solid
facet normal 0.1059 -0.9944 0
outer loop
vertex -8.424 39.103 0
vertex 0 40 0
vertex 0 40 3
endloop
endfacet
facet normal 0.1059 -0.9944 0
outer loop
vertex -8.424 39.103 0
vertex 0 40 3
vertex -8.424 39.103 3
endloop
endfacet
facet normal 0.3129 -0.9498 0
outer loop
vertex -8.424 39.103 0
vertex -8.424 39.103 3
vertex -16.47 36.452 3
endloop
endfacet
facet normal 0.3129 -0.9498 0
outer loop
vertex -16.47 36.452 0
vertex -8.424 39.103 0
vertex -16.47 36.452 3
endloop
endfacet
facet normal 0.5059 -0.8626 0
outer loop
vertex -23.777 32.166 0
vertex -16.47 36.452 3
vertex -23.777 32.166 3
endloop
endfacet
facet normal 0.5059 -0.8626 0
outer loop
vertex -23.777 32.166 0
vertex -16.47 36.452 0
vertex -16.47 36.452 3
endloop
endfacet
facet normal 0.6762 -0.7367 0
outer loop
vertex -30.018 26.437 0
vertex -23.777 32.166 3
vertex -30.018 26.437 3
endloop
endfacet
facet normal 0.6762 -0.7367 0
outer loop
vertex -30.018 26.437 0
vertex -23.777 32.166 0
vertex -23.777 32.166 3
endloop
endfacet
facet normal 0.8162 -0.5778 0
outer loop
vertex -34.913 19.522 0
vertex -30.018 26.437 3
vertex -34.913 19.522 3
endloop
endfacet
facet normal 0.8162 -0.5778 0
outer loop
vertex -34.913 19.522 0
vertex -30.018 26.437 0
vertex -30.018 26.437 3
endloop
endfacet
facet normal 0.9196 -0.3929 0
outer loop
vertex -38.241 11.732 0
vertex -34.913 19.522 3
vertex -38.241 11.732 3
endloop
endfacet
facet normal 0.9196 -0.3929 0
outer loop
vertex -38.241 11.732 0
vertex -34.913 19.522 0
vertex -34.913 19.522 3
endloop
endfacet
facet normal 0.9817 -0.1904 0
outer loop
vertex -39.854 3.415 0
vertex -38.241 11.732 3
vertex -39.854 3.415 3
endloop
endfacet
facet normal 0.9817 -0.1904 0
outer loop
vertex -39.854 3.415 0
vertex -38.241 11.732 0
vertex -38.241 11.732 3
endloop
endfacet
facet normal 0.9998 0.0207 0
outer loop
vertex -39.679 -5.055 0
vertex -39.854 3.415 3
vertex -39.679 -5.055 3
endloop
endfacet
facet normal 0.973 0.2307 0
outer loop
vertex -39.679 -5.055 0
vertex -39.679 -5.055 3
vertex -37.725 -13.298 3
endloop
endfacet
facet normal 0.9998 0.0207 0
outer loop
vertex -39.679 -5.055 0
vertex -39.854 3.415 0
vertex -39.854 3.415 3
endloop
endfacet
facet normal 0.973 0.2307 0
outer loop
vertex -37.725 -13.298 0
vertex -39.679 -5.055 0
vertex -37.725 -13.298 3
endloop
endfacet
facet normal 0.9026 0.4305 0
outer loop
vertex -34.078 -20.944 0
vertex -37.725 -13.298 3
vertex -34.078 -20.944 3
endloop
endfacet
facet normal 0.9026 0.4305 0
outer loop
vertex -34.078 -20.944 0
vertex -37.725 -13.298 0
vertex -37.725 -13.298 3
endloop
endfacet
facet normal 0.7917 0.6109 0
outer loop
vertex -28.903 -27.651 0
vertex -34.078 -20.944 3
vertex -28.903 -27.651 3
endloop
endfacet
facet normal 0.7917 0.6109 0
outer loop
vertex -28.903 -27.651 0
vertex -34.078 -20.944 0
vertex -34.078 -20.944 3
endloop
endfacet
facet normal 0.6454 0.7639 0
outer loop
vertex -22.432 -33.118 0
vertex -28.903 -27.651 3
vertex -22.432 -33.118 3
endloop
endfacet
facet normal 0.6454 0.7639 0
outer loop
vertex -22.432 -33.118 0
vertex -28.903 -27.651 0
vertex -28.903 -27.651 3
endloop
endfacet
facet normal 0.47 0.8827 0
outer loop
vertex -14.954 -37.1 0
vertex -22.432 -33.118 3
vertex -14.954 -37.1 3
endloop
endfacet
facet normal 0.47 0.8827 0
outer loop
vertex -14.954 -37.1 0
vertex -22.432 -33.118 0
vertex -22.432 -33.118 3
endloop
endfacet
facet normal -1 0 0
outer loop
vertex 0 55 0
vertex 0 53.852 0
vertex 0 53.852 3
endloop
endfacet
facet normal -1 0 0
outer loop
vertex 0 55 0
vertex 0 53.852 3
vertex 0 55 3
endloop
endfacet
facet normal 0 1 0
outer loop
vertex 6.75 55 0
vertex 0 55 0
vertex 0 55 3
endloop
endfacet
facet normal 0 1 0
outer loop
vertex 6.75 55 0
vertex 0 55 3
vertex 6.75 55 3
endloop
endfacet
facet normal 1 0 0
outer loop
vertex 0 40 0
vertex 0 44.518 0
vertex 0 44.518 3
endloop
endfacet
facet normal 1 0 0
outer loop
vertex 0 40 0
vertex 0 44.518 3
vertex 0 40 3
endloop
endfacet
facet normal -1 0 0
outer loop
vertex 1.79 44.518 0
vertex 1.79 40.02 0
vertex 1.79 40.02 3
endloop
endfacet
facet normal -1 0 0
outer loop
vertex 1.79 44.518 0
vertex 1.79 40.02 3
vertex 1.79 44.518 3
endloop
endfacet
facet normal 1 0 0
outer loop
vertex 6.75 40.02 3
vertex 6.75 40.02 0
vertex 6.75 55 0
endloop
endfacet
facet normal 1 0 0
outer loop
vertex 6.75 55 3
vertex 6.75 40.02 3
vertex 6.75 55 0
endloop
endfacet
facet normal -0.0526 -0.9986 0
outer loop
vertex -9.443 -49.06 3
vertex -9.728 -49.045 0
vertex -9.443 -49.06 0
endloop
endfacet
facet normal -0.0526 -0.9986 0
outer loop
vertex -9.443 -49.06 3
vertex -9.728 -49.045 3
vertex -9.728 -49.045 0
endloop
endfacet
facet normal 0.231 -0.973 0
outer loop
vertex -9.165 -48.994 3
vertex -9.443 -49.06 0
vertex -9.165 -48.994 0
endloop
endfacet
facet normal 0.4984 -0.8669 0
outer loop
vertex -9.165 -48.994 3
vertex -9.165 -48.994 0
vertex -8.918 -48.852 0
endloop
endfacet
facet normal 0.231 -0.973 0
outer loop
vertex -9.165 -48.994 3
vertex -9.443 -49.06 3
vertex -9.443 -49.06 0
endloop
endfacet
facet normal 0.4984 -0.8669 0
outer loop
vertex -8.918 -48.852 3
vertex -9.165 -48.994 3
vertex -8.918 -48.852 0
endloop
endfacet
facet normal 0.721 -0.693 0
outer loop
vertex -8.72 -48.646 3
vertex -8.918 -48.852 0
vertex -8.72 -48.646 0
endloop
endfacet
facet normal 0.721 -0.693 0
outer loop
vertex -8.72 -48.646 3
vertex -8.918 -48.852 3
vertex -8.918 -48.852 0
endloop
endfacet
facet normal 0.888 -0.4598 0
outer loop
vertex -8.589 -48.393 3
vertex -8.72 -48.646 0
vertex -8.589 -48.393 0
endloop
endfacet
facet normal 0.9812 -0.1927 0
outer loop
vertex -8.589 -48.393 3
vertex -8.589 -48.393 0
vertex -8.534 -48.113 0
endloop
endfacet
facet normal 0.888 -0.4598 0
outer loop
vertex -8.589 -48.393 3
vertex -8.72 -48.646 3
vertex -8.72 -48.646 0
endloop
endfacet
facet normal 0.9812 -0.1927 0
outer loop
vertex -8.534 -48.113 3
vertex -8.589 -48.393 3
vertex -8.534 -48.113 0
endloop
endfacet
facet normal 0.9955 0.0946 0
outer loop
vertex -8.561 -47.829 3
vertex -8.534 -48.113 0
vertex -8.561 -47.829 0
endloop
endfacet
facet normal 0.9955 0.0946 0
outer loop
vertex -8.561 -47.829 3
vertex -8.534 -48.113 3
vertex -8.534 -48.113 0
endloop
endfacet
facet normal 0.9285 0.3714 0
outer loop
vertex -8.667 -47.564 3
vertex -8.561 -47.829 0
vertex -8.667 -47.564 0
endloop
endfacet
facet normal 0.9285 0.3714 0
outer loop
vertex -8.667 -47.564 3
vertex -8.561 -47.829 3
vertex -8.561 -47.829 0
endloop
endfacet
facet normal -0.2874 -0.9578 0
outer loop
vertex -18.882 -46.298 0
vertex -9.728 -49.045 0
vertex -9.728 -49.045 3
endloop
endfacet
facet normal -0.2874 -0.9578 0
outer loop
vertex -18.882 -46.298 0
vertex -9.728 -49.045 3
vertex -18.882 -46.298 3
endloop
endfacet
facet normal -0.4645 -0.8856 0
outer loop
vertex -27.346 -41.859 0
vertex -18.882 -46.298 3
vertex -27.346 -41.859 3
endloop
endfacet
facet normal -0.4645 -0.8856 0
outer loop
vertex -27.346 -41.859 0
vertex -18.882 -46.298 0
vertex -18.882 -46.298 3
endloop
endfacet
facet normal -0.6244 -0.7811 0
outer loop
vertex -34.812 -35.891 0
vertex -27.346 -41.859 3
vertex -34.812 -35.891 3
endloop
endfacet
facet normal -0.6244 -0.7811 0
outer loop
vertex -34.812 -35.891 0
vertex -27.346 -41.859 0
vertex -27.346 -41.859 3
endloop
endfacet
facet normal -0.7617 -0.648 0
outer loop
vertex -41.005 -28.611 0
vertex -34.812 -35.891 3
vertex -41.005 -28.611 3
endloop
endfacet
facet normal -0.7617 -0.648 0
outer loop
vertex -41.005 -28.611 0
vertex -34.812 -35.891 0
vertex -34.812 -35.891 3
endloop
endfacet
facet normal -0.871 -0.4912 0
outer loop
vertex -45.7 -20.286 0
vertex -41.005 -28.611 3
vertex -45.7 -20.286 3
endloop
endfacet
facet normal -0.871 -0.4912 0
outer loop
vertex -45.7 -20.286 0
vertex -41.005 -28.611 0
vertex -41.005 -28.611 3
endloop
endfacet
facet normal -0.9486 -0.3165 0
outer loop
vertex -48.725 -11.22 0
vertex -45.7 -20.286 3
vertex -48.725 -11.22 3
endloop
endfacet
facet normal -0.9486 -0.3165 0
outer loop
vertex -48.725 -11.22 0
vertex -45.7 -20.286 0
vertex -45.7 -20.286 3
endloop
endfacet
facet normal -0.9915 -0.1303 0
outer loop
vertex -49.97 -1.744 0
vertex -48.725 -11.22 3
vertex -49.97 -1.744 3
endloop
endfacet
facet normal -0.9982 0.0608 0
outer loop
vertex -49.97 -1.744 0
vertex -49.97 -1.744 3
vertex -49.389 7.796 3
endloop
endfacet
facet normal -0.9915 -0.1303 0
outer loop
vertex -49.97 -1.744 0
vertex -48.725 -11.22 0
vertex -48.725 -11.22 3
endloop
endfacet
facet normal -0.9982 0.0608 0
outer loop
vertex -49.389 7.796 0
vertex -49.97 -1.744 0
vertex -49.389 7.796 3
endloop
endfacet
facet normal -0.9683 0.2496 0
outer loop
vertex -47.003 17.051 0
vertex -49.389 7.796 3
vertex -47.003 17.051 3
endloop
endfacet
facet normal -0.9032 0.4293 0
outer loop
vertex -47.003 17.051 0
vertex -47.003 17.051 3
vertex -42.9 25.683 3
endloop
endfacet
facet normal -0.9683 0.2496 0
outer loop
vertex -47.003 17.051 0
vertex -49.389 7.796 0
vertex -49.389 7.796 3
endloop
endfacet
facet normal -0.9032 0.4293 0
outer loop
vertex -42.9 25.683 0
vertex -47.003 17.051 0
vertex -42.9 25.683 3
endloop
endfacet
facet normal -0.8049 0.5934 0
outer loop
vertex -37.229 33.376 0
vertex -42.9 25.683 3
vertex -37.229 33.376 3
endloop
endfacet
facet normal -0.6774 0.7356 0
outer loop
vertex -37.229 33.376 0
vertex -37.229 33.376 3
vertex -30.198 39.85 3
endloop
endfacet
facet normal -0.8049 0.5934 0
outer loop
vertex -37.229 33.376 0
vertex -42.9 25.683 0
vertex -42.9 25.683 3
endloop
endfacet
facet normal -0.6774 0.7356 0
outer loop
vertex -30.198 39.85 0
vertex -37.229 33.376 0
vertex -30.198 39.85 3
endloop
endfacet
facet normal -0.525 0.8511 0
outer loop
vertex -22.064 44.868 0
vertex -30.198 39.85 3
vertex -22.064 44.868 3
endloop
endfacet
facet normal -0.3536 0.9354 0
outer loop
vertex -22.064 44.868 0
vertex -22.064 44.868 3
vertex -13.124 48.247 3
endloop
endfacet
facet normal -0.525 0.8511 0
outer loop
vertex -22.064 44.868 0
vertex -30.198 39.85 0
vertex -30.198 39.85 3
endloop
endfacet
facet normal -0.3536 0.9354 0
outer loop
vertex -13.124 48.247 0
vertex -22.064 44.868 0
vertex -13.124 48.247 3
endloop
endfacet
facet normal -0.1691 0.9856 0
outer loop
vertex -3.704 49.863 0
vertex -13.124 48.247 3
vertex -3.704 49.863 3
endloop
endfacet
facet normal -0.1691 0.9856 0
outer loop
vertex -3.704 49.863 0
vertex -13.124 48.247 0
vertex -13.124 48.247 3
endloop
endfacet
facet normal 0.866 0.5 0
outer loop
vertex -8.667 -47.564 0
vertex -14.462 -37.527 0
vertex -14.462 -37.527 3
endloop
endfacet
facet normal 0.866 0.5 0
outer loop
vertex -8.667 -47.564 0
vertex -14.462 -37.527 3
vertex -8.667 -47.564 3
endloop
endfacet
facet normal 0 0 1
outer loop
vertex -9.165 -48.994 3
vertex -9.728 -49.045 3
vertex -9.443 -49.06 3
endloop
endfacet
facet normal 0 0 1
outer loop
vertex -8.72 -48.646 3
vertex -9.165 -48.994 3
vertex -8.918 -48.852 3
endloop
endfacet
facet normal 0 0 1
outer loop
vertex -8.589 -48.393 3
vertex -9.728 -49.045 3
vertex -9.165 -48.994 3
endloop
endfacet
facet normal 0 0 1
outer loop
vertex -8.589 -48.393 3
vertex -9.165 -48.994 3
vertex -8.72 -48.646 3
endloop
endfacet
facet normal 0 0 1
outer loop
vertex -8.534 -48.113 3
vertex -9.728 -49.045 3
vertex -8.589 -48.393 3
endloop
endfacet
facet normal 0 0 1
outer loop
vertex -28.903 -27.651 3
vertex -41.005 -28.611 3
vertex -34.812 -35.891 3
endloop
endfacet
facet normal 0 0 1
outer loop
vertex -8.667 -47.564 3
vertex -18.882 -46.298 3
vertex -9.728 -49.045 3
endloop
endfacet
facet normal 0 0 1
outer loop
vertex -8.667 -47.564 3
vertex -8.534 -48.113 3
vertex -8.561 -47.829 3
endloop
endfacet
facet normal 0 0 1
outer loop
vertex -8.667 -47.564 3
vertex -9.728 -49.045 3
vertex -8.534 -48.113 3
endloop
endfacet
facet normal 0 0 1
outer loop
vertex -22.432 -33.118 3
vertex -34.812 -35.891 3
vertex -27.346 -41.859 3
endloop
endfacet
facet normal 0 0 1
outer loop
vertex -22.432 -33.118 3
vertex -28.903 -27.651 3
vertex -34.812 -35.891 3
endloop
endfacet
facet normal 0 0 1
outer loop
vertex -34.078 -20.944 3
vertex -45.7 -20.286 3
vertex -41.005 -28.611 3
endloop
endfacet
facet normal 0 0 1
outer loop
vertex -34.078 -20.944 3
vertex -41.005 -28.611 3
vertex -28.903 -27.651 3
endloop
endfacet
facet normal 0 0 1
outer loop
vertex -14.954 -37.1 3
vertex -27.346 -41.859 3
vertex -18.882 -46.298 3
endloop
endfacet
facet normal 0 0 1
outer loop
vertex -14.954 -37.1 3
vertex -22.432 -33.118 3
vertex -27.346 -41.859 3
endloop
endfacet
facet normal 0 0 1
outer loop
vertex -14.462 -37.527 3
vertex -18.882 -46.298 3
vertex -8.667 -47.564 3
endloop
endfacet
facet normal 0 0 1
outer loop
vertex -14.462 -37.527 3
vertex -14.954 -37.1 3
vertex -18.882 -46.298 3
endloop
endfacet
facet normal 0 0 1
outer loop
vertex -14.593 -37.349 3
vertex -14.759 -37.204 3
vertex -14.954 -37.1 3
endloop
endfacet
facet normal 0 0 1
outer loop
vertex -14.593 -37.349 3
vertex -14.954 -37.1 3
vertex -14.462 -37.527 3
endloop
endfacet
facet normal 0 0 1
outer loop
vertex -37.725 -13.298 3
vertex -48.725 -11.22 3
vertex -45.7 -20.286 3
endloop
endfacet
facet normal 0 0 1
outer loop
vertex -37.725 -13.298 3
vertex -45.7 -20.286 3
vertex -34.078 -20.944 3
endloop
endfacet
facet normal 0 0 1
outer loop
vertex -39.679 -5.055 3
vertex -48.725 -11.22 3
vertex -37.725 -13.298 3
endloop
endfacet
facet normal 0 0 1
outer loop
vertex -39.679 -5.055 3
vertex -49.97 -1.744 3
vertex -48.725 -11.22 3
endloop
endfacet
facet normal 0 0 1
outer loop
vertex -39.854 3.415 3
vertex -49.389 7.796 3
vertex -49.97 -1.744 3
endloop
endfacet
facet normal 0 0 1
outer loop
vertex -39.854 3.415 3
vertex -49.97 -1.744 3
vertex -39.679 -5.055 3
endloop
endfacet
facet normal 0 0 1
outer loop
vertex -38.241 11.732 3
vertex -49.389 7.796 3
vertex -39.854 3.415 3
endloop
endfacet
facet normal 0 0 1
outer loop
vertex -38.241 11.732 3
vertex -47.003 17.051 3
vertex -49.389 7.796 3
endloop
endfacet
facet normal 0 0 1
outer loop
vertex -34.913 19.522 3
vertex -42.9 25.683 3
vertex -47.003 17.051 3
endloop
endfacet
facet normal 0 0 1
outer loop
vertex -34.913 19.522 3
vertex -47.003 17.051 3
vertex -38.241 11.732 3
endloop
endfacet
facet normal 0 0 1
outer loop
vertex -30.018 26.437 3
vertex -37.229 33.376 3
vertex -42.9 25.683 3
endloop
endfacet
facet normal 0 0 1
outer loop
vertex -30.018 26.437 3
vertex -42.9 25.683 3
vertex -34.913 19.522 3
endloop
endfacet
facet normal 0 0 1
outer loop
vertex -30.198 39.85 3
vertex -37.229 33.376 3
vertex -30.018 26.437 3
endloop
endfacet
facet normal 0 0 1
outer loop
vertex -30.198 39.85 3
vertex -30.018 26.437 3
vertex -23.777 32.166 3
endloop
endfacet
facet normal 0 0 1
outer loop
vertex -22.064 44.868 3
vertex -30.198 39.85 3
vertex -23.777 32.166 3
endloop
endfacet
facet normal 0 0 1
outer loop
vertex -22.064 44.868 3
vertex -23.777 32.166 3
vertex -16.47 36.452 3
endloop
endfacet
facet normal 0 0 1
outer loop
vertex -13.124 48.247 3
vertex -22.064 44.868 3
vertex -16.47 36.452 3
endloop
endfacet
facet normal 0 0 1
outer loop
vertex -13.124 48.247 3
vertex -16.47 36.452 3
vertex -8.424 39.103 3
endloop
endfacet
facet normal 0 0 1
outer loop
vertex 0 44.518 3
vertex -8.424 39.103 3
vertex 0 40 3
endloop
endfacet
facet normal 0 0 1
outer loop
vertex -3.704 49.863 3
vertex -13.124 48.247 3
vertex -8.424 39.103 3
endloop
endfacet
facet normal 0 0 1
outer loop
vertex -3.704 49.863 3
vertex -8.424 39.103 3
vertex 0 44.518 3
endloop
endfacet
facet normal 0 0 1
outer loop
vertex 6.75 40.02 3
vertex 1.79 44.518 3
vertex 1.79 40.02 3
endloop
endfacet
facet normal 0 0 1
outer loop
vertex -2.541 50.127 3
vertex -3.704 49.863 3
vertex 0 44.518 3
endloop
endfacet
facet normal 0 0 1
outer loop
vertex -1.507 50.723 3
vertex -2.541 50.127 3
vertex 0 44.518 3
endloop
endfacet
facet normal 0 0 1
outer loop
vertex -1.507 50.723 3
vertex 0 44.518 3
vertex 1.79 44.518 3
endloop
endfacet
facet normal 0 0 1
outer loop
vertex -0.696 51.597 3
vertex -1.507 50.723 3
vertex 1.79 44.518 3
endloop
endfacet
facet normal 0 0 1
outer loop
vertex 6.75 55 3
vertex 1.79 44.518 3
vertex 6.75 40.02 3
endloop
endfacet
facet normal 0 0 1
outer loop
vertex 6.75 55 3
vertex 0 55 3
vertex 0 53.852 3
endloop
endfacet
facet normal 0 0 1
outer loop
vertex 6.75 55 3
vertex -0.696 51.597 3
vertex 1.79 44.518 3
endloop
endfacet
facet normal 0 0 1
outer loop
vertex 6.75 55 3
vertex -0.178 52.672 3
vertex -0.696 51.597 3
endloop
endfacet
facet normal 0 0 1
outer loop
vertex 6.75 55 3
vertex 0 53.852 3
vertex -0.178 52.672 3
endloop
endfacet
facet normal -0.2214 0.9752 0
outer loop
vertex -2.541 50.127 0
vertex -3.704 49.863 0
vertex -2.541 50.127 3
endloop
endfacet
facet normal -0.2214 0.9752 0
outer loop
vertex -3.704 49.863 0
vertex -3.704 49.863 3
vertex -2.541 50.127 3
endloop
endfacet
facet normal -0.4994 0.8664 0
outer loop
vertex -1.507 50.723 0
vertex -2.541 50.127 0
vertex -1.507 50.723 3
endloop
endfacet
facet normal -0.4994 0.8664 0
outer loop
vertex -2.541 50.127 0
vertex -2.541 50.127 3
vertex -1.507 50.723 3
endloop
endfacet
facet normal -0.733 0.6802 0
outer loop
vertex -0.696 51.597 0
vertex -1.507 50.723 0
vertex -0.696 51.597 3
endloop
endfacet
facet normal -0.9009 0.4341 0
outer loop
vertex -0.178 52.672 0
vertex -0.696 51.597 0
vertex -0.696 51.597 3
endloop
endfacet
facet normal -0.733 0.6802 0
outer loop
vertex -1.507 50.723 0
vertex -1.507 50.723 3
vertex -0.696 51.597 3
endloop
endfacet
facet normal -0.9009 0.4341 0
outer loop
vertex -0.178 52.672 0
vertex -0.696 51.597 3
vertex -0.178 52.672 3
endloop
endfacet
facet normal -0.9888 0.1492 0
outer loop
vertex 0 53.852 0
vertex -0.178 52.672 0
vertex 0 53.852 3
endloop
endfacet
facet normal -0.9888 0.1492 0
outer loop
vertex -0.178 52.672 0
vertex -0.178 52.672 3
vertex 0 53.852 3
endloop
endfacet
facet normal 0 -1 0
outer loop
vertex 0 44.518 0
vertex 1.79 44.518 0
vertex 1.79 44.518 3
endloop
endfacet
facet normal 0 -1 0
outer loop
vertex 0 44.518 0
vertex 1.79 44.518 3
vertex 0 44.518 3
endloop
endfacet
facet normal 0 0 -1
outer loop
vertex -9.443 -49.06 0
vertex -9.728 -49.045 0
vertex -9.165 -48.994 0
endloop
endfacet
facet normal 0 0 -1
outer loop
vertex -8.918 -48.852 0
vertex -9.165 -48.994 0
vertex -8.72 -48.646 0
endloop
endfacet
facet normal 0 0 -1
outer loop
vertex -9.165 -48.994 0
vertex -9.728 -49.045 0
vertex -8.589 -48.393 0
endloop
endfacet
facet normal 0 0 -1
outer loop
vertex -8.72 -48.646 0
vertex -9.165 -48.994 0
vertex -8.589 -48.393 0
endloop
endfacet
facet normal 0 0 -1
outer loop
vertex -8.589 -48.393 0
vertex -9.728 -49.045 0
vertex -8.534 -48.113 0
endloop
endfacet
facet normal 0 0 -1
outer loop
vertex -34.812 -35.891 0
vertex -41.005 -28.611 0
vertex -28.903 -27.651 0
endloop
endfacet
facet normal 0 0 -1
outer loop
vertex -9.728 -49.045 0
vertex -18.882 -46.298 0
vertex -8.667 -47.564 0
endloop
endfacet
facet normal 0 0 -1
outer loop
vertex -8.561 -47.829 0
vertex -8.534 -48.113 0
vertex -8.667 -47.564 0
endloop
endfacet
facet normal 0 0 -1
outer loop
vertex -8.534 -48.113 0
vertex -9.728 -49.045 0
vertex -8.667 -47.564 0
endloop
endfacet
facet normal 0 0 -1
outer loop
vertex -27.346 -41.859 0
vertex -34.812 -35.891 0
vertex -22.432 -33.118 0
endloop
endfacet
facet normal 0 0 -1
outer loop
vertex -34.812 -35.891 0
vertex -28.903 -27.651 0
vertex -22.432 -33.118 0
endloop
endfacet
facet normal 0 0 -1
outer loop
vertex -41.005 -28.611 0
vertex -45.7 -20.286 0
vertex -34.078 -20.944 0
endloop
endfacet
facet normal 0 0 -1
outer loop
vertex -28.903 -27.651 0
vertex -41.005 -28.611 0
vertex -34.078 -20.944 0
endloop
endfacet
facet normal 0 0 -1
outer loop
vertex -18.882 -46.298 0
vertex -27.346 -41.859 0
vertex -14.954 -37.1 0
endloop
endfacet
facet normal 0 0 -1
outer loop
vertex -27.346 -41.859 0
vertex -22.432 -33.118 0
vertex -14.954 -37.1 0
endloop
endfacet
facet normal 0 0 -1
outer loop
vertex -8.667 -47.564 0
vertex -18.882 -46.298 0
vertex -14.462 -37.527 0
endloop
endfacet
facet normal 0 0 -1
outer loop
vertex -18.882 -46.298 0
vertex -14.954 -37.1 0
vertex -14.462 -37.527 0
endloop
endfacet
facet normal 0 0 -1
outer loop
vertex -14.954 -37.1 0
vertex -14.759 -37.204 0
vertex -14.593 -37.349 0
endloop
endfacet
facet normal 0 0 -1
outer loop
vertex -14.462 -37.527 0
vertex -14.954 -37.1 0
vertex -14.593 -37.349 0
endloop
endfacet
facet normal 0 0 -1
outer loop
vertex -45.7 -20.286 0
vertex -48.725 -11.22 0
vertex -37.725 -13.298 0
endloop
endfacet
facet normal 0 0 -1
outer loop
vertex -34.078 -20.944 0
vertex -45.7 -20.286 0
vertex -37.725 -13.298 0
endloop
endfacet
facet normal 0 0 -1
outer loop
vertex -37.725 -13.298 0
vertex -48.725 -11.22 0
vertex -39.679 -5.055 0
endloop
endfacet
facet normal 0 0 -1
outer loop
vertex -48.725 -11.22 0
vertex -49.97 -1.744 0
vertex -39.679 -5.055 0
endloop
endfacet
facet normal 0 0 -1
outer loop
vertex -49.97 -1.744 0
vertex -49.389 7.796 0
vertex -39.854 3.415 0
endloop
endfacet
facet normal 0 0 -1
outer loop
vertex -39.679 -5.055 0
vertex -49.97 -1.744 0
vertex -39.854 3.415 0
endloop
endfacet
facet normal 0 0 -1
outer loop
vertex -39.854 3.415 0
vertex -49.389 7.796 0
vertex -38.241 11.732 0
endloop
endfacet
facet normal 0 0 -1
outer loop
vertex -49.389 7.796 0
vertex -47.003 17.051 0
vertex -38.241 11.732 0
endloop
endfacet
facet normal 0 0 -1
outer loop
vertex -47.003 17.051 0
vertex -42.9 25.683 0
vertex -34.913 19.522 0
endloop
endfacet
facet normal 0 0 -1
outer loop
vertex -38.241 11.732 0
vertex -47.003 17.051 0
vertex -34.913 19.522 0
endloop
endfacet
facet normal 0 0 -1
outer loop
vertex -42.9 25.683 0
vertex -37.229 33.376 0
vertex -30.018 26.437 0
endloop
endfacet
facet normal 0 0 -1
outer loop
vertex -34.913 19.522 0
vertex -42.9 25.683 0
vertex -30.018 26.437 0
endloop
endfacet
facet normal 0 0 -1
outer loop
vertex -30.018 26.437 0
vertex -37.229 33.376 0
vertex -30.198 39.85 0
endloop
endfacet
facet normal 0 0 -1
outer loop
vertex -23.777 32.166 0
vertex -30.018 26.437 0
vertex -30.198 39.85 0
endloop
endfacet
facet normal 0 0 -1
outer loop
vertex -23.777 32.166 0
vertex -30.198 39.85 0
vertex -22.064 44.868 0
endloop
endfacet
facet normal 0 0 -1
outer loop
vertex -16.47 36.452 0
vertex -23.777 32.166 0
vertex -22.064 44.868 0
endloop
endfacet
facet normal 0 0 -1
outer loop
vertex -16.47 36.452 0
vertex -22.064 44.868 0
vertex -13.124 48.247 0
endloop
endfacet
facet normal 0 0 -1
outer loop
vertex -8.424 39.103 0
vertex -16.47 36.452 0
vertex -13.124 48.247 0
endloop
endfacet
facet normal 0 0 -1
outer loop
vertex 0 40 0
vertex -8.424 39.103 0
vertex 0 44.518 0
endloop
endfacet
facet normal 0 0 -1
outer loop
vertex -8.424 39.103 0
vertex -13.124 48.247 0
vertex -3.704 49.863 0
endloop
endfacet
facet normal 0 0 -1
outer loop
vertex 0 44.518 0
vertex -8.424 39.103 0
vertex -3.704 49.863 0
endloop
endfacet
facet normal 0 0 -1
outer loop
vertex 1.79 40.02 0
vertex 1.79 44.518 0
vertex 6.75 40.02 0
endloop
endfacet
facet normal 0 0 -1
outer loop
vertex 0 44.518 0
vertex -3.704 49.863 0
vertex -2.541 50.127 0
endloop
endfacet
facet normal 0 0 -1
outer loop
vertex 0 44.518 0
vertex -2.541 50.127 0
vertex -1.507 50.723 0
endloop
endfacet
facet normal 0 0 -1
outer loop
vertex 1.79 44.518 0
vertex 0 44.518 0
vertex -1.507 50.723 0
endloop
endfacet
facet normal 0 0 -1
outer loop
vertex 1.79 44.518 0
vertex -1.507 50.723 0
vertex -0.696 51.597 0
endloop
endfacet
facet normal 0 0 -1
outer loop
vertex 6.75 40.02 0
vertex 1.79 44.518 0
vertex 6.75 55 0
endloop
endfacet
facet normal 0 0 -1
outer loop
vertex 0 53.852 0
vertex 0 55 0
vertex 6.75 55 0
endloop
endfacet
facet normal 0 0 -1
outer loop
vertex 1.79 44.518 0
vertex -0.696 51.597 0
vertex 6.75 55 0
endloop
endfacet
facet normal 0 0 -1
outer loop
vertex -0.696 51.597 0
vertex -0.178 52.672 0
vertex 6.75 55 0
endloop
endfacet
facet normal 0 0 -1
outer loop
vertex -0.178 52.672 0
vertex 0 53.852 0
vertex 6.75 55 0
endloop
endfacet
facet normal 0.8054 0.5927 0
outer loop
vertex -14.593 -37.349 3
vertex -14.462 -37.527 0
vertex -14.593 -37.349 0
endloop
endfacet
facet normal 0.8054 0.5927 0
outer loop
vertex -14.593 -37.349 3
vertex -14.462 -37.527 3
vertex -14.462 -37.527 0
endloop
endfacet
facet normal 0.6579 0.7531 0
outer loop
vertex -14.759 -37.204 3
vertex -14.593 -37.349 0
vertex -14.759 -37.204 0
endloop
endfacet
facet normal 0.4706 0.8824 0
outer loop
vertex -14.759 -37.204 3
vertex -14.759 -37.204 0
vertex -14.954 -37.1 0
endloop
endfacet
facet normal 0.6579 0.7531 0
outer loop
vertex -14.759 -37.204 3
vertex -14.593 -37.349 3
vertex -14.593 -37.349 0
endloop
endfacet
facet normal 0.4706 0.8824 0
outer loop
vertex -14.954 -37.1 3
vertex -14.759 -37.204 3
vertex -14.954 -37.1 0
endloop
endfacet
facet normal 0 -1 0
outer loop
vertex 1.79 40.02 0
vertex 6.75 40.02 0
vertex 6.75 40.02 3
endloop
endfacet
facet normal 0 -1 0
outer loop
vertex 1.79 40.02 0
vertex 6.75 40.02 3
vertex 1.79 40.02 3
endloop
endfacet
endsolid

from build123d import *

# Parameters (mm, degrees)
SKETCH1_W           = 6.75
SKETCH1_H           = 5
BOSS_EXTRUDE1_DEPTH = 3
FILLET3_R           = 1
FILLET4_R           = 1
FILLET6_R           = 4


with BuildPart() as part:
    # Sketch1 → Boss-Extrude1 (new body)
    with BuildSketch(Plane.XY):
        with Locations((3.375, 52.5)):
            Rectangle(SKETCH1_W, SKETCH1_H)
        with BuildLine():
            Line((0, 50), (6.75, 50))
            Line((6.75, 50), (6.75, 40.02))
            Line((6.75, 40.02), (1.79, 40.02))
            Line((1.79, 40.02), (1.79, 44.518418243))
            Line((1.79, 44.518418243), (0, 44.518418243))
            Line((0, 44.518418243), (0, 40))
            ThreePointArc((0, 40), (-39.300483317, 7.44795348), (-14.635408574, -37.226399448))
            Line((-14.635408574, -37.226399448), (-7.59560281, -49.419700707))
            ThreePointArc((-7.59560281, -49.419700707), (-49.854714097, 3.808868904), (0, 50))
        make_face()
    extrude(amount=BOSS_EXTRUDE1_DEPTH)

    # Fillet3
    fillet3_edges = [part.edges().sort_by_distance(p)[0] for p in [
        (-7.59560281, -49.419700707, 1.5),
    ]]
    fillet(fillet3_edges, radius=FILLET3_R)

    # Fillet4
    fillet4_edges = [part.edges().sort_by_distance(p)[0] for p in [
        (-14.635408574, -37.226399448, 1.5),
    ]]
    fillet(fillet4_edges, radius=FILLET4_R)

    # Fillet6
    fillet6_edges = [part.edges().sort_by_distance(p)[0] for p in [
        (0, 50, 1.5),
    ]]
    fillet(fillet6_edges, radius=FILLET6_R)


solid = part.part
